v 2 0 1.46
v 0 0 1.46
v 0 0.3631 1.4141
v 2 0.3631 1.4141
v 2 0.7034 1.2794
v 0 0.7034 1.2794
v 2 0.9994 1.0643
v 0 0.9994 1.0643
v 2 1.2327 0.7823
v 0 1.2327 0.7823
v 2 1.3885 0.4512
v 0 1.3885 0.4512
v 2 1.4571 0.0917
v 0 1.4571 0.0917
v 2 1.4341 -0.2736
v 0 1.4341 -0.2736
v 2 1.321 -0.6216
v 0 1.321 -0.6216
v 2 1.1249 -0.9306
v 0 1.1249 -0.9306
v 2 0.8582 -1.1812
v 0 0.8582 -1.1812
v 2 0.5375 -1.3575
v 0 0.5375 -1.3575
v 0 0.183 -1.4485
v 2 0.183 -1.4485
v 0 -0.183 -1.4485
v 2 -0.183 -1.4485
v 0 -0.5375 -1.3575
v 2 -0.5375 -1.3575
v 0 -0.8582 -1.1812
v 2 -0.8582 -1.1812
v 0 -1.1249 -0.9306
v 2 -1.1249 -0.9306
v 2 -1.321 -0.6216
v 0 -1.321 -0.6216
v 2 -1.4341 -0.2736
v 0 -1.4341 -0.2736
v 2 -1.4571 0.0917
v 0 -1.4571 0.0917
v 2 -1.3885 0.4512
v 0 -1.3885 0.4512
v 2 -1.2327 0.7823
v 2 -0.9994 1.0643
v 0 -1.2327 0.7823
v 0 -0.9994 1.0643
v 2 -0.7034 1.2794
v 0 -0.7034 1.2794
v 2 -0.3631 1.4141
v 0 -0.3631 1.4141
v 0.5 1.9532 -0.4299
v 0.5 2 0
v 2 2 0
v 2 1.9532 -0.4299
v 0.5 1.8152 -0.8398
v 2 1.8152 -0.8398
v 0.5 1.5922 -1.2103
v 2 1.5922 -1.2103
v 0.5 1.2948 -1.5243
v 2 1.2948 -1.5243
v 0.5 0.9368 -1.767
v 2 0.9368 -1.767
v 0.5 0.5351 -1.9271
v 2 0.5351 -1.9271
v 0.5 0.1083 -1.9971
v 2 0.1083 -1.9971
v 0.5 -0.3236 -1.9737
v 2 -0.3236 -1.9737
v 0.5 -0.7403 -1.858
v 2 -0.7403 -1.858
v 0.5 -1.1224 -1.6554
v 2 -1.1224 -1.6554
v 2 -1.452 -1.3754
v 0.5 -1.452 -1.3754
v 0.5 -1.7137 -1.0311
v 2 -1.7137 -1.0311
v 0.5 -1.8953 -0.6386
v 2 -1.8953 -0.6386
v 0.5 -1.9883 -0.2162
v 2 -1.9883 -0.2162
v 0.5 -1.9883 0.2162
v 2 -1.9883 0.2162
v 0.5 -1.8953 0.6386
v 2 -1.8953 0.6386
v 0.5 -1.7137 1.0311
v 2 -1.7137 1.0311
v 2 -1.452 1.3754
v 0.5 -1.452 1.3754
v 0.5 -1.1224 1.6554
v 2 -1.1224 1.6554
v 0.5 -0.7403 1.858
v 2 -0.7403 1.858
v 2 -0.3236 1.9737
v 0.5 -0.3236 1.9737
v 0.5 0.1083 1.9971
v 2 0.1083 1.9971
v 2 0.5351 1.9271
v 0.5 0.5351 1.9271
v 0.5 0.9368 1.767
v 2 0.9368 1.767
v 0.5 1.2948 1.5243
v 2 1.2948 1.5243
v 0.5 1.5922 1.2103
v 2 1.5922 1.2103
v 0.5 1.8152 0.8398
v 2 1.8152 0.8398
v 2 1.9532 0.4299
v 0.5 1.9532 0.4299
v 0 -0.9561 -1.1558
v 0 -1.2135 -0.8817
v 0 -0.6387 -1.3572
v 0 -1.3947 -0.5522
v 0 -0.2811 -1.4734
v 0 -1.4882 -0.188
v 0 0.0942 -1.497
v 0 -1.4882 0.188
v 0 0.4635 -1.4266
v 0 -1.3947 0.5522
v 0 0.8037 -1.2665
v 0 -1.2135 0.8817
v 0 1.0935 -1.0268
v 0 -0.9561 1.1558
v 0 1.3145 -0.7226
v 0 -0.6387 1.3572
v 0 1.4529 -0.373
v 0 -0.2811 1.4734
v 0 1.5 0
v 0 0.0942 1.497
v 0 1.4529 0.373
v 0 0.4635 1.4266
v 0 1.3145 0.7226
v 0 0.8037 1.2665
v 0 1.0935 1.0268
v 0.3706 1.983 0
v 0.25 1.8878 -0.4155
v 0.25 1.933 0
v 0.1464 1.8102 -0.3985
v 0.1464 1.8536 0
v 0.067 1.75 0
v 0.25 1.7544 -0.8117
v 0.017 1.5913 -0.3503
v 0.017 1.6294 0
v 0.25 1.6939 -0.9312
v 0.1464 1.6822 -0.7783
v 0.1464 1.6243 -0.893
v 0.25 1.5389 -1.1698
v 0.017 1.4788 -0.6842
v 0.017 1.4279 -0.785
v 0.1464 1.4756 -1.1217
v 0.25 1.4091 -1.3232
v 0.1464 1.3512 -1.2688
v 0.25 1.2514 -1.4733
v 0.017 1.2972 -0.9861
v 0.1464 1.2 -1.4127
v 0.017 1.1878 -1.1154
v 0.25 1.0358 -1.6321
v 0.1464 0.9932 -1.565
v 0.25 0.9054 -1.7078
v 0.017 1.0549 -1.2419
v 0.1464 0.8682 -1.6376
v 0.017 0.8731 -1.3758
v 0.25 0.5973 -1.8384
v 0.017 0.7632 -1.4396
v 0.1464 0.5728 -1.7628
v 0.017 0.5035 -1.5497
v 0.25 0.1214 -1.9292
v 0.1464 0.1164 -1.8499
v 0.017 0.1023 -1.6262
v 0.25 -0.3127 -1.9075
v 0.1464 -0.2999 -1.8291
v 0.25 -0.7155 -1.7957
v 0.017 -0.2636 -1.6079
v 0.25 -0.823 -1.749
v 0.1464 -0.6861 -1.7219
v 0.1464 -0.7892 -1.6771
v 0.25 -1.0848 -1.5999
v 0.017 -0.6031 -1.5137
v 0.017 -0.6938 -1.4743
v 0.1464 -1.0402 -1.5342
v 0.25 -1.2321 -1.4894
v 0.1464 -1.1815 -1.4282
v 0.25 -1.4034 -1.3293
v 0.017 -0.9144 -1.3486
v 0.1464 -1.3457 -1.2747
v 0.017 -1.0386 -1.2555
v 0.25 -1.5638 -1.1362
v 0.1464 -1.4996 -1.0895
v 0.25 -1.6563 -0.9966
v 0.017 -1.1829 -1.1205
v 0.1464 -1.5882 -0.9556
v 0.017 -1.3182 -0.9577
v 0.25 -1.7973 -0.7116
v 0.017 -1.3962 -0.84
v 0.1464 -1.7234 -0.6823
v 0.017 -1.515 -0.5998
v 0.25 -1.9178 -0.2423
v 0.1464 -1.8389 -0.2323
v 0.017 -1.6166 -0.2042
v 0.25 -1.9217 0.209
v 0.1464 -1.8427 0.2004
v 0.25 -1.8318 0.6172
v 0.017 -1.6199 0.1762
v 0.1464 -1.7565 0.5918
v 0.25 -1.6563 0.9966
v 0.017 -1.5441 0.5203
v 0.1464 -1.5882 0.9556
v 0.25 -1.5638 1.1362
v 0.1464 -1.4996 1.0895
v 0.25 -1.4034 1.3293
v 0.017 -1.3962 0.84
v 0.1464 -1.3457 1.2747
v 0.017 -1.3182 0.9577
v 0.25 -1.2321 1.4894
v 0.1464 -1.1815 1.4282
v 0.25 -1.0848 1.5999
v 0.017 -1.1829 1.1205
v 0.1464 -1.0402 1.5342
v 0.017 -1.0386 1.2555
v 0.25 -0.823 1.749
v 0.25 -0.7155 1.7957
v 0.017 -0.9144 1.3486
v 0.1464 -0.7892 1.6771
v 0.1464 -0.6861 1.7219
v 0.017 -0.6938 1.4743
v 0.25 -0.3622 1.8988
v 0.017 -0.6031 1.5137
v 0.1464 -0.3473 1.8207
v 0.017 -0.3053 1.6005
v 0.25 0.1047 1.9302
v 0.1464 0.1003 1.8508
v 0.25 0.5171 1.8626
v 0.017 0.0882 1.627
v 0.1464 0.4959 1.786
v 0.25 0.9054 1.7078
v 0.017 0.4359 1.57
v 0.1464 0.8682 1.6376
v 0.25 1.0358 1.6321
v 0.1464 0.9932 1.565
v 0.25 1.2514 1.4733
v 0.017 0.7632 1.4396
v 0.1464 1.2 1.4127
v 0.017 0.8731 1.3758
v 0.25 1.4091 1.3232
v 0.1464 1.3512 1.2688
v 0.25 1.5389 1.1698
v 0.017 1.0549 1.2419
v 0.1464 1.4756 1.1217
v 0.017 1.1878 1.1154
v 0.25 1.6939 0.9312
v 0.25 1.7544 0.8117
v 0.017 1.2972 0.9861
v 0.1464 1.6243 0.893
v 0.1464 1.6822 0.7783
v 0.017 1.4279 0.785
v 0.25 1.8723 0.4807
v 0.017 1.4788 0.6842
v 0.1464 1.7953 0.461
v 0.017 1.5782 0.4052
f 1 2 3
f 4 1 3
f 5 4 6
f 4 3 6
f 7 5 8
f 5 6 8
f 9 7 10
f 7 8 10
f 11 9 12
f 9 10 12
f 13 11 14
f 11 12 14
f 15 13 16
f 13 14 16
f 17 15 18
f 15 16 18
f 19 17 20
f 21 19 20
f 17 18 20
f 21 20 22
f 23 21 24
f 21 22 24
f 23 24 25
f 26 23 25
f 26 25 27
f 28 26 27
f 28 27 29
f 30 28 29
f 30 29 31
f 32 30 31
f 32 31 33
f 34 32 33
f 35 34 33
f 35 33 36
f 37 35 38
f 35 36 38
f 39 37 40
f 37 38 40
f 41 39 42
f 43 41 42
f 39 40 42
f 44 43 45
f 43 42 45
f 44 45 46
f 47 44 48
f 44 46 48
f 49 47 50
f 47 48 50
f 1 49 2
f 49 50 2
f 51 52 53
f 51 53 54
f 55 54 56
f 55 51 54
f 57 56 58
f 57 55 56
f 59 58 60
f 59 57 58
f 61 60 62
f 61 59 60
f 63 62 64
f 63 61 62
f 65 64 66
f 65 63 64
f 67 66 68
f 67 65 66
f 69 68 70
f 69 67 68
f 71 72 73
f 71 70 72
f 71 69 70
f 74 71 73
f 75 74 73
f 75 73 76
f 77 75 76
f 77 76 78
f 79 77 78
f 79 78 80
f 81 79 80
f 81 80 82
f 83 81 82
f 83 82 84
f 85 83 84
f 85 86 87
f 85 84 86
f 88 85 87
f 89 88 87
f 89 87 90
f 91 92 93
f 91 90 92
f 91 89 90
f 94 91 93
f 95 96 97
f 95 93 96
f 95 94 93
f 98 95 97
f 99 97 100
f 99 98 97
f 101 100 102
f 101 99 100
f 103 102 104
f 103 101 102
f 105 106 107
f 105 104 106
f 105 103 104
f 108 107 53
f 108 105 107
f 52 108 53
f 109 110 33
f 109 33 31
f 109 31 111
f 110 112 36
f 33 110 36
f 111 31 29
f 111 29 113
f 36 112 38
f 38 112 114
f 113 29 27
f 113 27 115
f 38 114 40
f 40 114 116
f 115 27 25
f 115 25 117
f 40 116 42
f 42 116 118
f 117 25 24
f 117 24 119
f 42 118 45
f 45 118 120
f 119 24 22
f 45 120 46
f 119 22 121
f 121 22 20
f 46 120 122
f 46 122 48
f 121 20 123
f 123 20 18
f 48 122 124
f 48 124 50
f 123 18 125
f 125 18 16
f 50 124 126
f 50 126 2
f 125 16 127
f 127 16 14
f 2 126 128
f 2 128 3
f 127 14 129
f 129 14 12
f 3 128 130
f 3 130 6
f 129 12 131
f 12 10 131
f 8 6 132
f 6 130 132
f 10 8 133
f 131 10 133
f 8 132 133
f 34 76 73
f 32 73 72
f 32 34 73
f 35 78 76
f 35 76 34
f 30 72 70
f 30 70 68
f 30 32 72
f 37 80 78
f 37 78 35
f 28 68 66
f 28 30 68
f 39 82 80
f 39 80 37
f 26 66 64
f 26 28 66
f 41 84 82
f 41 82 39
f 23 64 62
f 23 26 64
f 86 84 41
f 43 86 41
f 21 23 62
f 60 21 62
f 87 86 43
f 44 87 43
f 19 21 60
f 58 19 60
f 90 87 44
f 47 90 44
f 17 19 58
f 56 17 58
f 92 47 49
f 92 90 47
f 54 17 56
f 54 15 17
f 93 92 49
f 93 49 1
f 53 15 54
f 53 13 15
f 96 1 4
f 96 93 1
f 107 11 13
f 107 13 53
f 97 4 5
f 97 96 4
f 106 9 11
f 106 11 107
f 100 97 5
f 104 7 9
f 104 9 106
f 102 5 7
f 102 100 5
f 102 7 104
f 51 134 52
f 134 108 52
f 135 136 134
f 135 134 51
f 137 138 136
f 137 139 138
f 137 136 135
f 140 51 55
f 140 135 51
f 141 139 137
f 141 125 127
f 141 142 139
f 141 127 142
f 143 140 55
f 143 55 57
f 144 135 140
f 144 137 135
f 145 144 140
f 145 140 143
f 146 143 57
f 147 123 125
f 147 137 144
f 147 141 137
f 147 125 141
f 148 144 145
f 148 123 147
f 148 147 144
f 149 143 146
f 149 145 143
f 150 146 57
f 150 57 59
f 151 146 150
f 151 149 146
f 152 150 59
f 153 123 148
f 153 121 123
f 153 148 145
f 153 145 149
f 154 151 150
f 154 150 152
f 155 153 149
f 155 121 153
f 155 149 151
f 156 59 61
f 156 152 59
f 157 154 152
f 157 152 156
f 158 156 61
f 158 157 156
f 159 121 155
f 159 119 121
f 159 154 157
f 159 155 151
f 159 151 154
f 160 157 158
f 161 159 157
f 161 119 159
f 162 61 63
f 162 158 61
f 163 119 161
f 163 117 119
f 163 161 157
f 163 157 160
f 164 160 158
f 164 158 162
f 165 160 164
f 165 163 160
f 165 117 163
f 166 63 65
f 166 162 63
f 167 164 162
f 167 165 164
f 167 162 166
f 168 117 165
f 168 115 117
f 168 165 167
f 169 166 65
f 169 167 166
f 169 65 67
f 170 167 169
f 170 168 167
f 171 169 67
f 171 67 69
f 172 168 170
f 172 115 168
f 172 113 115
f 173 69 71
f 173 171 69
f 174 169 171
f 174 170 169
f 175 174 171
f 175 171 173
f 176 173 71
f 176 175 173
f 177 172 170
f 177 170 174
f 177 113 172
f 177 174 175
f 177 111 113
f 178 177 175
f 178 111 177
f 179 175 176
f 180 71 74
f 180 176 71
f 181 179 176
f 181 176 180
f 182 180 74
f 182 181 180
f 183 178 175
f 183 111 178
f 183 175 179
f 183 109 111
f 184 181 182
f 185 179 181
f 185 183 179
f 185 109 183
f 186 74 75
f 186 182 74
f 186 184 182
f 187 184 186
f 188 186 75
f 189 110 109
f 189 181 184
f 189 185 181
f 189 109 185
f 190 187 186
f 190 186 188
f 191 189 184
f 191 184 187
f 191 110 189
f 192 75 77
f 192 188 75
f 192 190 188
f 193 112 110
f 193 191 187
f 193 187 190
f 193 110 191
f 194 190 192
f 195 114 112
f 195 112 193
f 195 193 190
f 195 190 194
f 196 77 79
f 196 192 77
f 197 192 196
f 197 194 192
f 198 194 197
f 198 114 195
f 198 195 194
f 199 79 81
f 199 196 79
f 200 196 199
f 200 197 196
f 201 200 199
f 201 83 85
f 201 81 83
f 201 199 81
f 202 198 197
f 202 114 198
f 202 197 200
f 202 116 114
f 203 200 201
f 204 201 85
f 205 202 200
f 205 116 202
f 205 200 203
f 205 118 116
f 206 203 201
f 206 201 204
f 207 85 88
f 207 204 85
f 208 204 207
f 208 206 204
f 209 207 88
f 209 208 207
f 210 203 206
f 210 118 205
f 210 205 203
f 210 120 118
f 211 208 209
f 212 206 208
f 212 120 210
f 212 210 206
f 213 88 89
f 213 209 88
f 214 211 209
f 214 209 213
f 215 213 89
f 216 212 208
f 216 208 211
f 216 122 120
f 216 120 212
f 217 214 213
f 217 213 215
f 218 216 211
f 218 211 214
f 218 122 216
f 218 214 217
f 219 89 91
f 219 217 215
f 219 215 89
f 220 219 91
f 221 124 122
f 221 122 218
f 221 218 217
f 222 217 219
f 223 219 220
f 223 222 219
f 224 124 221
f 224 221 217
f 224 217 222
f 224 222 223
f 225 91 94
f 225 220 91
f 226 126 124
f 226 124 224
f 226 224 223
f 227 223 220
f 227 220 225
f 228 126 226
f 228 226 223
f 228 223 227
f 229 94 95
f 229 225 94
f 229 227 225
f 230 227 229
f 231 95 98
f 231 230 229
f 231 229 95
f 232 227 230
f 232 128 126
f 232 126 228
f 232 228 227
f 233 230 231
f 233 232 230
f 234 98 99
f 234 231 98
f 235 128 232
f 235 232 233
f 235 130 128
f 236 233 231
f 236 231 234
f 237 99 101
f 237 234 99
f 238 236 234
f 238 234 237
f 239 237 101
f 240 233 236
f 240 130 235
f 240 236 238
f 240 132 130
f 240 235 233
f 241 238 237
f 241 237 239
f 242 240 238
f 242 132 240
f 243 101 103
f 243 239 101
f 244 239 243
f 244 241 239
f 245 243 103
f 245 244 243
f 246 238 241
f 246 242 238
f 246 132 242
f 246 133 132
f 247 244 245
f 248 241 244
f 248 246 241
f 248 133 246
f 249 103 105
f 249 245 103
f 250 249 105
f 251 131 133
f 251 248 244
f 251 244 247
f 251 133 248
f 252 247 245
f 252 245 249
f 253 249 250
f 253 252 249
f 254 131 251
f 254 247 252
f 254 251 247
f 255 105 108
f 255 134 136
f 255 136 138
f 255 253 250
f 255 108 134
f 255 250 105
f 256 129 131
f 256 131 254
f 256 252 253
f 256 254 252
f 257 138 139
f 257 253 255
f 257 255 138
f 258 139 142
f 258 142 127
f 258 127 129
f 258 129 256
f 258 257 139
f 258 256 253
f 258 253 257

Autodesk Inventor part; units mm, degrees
ref_plane "YZ Plane" through (0, 0, 0) normal (1, 0, 0) x (0, 1, 0)
ref_plane "XZ Plane" through (0, 0, 0) normal (0, 1, 0) x (-1, 0, 0)
ref_plane "XY Plane" through (0, 0, 0) normal (0, 0, 1) x (1, 0, 0)
sketch "スケッチ1" plane through (0, 0, 0) normal (1, 0, 0) x (0, 1, 0)
  circle A0 centre (0, 0) radius 2
  dimension "d0" = 4
extrude "押し出し1" add sketch "スケッチ1" along normal blind 2
sketch "スケッチ2" plane through (0, 0, 0) normal (-1, 0, 0) x (0, 0, 1)
  circle A0 centre (0, 0) radius 1.46
  dimension "d3" = 2.92
extrude "押し出し2" cut sketch "スケッチ2" against normal blind 3.5
fillet "フィレット1" radius 0.5 1 edges at (0, -2, 0)
properties part number "Stopper"
